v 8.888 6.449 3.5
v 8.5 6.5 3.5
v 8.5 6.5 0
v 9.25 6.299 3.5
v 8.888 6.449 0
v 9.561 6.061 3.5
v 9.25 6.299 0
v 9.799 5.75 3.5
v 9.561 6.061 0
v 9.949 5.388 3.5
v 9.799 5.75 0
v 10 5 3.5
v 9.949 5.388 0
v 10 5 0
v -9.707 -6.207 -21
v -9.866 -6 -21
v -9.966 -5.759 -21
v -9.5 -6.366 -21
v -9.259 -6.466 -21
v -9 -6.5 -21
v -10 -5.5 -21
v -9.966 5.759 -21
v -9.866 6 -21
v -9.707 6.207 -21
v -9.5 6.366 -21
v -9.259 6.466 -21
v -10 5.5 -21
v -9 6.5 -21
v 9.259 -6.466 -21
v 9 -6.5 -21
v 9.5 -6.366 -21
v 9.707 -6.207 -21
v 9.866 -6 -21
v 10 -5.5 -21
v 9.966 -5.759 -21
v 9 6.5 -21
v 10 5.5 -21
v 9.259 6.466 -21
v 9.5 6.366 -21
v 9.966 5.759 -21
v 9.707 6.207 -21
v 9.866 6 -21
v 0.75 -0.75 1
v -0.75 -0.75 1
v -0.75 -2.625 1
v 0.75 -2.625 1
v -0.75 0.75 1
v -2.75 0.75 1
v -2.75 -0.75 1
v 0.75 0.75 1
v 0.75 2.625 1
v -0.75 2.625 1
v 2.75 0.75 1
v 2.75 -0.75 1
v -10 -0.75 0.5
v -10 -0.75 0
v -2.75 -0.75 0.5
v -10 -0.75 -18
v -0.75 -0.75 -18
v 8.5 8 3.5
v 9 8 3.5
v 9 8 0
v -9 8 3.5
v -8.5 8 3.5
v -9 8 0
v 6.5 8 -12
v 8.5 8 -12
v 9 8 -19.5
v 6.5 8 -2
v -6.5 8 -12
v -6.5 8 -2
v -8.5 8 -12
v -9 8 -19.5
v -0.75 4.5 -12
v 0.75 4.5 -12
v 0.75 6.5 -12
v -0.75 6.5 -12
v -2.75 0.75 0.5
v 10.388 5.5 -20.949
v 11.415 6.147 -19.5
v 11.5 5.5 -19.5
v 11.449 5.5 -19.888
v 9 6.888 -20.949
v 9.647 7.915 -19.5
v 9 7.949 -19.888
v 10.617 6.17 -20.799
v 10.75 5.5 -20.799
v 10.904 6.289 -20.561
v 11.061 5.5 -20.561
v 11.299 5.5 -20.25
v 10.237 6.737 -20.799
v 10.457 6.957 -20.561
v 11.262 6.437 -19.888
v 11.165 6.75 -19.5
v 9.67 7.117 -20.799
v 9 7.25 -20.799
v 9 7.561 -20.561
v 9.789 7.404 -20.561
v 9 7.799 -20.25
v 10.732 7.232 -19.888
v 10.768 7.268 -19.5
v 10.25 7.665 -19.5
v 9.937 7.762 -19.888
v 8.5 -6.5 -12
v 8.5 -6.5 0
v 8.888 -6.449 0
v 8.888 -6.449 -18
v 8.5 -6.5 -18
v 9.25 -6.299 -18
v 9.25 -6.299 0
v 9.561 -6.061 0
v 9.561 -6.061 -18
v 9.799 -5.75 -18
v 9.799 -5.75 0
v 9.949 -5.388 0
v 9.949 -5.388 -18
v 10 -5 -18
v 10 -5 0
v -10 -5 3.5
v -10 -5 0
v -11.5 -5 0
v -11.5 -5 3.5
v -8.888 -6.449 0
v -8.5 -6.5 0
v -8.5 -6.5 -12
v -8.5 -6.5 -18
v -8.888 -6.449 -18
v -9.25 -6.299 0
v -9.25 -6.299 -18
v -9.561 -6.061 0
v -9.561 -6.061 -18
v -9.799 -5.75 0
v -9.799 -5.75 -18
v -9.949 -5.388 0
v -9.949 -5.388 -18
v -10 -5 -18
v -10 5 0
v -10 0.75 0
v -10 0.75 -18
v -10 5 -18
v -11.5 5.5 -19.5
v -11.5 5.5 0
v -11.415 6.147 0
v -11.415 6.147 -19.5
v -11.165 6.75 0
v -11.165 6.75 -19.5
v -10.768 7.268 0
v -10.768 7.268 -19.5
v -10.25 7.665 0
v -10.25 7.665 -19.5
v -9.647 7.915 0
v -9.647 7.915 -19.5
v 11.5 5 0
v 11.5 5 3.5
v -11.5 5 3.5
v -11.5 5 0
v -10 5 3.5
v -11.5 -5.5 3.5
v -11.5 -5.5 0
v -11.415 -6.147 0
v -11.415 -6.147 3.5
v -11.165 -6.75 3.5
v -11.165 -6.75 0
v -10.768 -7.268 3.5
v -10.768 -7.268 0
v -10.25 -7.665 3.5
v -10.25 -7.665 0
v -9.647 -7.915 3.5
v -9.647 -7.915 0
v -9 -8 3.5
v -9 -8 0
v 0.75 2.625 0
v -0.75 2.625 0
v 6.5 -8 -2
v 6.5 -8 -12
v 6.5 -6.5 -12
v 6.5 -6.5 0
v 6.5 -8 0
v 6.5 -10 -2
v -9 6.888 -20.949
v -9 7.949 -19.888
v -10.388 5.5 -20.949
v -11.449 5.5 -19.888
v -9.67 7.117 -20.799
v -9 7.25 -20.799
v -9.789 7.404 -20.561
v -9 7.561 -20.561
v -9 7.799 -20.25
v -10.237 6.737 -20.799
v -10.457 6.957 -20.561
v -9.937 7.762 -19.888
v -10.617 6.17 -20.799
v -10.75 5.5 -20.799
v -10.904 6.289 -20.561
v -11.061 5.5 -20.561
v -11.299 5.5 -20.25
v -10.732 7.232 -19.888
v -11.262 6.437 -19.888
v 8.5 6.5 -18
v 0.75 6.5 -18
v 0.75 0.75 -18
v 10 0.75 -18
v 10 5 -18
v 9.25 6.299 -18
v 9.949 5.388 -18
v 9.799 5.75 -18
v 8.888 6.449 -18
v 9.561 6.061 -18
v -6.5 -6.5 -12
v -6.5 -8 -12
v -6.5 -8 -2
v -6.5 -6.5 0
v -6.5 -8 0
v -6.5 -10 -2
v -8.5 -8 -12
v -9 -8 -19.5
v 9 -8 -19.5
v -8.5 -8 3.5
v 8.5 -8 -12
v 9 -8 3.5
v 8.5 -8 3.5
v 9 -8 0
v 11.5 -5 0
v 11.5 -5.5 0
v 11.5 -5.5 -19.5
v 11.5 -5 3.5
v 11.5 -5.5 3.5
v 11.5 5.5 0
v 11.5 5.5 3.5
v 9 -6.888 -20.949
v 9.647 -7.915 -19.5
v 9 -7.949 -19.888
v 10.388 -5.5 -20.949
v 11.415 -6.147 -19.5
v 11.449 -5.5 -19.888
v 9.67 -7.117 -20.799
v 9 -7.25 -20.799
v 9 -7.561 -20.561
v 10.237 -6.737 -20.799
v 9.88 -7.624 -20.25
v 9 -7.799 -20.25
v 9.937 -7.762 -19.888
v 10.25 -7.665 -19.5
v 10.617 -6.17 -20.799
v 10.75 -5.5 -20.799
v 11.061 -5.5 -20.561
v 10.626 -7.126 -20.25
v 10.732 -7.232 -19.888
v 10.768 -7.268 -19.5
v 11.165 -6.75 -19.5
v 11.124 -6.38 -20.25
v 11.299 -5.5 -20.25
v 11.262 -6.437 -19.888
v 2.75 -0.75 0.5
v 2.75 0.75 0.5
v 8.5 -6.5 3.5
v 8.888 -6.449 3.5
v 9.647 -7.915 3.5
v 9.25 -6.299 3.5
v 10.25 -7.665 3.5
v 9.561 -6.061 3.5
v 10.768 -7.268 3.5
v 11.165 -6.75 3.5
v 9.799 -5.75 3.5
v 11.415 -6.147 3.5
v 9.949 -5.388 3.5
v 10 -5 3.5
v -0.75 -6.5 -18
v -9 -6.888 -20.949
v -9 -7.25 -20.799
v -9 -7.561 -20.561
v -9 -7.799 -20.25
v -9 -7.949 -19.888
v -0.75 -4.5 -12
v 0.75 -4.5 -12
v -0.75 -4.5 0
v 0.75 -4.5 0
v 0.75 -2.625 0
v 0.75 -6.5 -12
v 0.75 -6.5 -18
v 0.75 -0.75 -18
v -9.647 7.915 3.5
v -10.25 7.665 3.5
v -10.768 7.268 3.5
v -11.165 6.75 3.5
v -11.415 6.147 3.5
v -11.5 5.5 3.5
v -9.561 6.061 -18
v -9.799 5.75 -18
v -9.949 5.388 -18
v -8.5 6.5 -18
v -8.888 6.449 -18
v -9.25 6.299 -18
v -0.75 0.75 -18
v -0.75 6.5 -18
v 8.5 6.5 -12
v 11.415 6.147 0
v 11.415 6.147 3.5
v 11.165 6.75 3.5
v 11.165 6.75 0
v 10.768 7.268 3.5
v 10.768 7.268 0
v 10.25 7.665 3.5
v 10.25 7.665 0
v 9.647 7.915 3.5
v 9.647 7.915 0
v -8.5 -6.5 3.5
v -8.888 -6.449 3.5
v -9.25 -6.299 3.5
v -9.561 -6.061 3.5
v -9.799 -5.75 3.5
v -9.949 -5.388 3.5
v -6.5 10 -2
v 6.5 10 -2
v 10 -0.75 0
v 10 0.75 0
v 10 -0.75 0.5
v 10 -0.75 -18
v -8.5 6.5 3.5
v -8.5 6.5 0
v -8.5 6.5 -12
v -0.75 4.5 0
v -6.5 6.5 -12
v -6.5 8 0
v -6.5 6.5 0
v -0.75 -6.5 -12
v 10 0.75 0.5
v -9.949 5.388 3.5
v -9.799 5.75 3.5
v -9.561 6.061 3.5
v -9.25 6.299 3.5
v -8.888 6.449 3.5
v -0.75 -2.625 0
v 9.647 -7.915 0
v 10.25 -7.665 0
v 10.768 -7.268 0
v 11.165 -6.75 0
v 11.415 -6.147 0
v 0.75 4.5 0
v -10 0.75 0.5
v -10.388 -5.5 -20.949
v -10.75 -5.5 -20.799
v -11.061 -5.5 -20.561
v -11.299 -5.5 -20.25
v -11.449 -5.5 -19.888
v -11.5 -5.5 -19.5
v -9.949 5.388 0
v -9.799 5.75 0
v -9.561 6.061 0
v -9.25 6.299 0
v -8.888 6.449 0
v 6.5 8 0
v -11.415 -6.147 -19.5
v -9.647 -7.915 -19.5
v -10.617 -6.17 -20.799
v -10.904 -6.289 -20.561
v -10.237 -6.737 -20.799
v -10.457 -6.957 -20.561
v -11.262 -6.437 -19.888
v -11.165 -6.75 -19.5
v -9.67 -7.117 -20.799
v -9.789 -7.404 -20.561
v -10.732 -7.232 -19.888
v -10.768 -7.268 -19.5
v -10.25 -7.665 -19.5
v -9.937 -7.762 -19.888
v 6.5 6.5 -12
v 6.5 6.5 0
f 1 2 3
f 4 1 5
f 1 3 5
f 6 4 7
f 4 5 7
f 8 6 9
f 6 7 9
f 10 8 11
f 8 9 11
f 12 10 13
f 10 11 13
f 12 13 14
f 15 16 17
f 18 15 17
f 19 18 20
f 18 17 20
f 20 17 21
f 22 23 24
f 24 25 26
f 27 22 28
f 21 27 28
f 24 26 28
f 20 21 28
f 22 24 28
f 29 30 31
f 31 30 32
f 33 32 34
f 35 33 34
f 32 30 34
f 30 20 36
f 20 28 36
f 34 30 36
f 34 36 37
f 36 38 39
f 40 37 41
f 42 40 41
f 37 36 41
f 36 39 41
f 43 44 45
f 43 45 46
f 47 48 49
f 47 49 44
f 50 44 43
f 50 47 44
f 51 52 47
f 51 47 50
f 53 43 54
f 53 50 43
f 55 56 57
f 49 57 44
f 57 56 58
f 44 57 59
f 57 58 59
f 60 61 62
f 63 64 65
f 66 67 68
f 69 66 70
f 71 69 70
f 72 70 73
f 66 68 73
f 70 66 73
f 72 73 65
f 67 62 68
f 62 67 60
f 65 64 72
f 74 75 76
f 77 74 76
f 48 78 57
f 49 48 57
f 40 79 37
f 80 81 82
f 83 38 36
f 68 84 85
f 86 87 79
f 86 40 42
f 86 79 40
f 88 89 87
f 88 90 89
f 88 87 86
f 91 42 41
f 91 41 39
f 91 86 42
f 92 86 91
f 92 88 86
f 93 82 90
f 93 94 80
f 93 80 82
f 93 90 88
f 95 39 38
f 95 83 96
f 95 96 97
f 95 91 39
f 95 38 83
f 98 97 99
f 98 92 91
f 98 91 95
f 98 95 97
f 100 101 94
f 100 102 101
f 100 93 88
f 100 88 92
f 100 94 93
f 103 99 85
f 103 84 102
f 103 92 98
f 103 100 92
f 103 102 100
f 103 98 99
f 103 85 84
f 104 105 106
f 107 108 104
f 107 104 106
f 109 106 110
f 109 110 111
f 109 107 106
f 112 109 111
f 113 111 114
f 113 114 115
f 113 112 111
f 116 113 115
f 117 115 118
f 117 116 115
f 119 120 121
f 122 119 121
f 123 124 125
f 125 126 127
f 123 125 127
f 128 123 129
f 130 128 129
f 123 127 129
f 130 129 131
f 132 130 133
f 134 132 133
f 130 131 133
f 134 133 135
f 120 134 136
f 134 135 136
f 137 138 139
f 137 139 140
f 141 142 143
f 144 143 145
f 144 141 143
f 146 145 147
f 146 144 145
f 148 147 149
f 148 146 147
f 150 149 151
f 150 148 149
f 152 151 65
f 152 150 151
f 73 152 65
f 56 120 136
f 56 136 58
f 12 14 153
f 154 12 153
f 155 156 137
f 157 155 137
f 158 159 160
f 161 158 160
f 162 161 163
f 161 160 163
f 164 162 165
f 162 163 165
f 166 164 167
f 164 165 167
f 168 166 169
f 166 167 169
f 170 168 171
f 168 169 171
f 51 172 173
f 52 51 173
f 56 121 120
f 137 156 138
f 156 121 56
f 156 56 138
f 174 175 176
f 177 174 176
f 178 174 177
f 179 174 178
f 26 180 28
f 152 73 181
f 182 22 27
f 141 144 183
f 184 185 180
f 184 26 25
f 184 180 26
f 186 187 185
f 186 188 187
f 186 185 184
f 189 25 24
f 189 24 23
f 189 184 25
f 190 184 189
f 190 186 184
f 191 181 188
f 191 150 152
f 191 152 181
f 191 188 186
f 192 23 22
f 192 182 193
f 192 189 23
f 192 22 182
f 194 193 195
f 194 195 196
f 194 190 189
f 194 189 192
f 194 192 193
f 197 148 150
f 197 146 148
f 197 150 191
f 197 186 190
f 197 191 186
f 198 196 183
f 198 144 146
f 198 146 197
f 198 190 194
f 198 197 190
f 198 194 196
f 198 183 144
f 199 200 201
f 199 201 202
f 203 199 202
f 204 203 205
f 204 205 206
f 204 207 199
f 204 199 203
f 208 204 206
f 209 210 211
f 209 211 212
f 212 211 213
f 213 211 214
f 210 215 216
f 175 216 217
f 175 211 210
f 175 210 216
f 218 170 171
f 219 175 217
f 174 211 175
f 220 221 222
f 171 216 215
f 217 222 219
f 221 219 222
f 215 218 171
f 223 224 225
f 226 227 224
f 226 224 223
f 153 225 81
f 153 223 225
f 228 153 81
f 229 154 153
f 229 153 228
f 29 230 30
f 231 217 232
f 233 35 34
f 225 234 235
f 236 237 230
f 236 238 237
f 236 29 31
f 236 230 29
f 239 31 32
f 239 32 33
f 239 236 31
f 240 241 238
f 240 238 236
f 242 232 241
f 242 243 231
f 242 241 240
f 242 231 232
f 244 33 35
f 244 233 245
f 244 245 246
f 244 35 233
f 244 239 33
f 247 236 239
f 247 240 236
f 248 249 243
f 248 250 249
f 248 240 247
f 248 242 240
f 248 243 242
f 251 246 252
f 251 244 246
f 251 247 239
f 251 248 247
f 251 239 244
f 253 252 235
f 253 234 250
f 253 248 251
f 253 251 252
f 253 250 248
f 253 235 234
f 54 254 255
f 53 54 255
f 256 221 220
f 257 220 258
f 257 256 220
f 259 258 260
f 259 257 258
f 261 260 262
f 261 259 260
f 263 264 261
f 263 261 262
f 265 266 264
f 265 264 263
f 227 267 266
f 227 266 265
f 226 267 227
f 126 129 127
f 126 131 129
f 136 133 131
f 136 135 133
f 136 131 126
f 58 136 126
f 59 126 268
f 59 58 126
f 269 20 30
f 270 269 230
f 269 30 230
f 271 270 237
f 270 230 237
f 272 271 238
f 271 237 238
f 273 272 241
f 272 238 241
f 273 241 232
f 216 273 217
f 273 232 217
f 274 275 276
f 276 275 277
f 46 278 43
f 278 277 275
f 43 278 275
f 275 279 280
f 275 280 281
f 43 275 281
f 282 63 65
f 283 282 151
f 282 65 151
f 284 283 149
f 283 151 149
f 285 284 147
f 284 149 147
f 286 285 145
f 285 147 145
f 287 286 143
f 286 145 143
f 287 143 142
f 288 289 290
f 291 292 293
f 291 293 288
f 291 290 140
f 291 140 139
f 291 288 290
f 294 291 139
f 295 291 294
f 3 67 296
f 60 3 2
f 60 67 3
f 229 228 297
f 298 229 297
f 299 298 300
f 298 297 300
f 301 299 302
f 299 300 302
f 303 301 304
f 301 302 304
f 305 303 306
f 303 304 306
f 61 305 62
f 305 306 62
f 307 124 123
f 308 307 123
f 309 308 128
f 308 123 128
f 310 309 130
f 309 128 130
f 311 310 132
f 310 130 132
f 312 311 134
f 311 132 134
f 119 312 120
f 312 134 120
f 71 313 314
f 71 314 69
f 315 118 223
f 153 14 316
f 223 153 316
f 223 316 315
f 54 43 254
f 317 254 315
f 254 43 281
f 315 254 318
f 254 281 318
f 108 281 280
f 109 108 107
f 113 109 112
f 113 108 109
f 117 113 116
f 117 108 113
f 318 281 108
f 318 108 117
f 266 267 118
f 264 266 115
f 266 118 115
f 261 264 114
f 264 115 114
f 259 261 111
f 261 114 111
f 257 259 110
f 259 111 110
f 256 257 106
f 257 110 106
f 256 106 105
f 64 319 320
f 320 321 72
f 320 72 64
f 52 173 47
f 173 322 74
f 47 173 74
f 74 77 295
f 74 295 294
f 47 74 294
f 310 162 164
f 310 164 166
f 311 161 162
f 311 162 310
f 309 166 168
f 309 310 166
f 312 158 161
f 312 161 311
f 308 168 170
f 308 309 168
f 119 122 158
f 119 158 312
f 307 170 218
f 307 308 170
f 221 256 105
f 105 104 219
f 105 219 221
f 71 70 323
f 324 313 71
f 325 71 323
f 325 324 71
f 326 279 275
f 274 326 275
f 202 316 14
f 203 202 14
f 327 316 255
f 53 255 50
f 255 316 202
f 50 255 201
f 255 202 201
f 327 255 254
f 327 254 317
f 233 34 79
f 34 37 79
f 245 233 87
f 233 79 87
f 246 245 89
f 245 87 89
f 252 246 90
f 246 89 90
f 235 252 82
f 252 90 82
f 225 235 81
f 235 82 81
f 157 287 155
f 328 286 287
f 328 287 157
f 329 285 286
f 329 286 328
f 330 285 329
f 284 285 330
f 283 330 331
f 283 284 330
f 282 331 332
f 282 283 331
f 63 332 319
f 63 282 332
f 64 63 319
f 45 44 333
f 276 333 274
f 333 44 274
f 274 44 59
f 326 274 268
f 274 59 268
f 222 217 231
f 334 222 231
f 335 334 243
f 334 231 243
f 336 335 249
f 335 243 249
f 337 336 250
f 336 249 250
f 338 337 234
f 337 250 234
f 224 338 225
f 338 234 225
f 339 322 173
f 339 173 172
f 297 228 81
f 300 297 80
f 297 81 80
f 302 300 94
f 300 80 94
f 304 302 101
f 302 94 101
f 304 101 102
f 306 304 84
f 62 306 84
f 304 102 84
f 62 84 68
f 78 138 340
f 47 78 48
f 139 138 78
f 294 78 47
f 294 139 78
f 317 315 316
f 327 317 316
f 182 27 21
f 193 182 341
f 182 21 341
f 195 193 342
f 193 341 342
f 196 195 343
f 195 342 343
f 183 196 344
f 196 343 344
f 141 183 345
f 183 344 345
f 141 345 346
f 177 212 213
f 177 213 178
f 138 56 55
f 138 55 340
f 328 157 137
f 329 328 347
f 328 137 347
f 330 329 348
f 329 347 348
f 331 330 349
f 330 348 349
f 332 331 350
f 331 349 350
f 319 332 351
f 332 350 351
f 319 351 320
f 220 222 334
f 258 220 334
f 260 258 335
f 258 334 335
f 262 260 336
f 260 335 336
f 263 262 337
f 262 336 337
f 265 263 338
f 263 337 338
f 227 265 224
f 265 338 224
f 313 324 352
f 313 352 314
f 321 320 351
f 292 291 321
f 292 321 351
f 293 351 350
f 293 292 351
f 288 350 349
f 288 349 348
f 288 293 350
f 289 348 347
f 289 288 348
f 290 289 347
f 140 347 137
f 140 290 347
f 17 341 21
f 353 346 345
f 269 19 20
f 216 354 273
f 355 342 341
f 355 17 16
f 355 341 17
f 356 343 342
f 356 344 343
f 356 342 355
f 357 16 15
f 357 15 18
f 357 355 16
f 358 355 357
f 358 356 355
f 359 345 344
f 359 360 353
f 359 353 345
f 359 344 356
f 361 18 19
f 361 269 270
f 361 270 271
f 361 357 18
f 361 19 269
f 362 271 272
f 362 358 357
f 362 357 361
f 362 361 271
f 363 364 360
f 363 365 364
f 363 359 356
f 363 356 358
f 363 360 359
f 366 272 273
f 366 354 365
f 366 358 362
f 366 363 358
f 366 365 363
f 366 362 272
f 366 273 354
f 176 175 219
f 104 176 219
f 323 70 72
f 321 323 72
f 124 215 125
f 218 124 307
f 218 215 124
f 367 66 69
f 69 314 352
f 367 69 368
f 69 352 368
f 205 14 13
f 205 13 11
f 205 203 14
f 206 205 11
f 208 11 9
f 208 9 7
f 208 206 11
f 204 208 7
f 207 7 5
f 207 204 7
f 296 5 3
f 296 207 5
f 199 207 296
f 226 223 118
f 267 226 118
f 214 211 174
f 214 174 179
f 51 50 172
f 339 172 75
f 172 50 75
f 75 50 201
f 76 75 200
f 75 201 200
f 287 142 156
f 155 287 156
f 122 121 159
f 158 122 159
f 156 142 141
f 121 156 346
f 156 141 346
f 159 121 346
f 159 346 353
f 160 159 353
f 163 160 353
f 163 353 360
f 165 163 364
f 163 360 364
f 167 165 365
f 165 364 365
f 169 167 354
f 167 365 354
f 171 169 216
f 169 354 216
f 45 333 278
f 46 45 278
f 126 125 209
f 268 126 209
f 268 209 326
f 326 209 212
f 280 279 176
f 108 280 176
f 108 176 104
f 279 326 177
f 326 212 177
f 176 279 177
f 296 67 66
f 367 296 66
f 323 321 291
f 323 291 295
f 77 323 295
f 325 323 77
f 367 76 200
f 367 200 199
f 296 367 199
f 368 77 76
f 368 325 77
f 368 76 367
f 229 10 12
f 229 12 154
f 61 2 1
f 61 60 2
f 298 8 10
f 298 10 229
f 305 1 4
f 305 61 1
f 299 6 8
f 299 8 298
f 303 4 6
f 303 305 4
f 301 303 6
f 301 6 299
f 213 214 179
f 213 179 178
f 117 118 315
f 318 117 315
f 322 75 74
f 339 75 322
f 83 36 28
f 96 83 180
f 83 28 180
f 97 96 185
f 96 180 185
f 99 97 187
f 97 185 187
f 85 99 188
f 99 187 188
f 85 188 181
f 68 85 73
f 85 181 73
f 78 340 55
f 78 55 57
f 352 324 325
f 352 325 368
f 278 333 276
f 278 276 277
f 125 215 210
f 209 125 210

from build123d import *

# Parameters (mm, degrees)
F0_W      = 23
F0_H      = 16
F1_DEPTH  = 21
F2_R      = 2.5
F3_W      = 9.25
F3_H      = 5.75
F4_DEPTH  = 18
F5_R      = 1.5
F6_W      = 2
F6_H      = 12
F7_DEPTH  = 1.5
F8_W      = 2
F8_H      = 12
F9_DEPTH  = 1.5
F10_W     = 2
F10_H     = 12
F11_DEPTH = 1.5
F14_DEPTH = 3.5
F16_DEPTH = 1
F18_W     = 7.25
F18_H     = 1.5
F17_W     = 7.25
F17_H     = 1.5
F19_DEPTH = 0.5
F20_R     = 1.5
F21_DEPTH = 13


with BuildPart() as f1:
    # F0 (on Top) → F1 (new body)
    with BuildSketch(Plane.XY):
        Rectangle(F0_W, F0_H)
    extrude(amount=-F1_DEPTH)

    # F2
    f2_edges = [f1.edges().sort_by_distance(p)[0] for p in [
        (11.5, -8, -10.5),
        (11.5, 8, -10.5),
        (-11.5, -8, -10.5),
        (-11.5, 8, -10.5),
    ]]
    fillet(f2_edges, radius=F2_R)

    # F3 (on face) → F4 (cut)
    with BuildSketch(Plane.XY):
        with Locations((-5.375, 3.625)):
            Rectangle(F3_W, F3_H)
        with Locations((5.375, 3.625)):
            Rectangle(F3_W, F3_H)
        with Locations((5.375, -3.625)):
            Rectangle(F3_W, F3_H)
        with Locations((-5.375, -3.625)):
            Rectangle(F3_W, F3_H)
    extrude(amount=-F4_DEPTH, mode=Mode.SUBTRACT)

    # F5
    f5_edges = [f1.edges().sort_by_distance(p)[0] for p in [
        (-10, 6.5, -9),
        (-10, -6.5, -9),
        (10, -6.5, -9),
        (10, 6.5, -9),
    ]]
    fillet(f5_edges, radius=F5_R)

    # F6 (on face) → F7 (cut, through all)
    with BuildSketch(Plane.YZ.offset(0.75)):
        with Locations((-5.5, -6)):
            Rectangle(F6_W, F6_H)
        with Locations((5.5, -6)):
            Rectangle(F6_W, F6_H)
    extrude(amount=-F7_DEPTH, mode=Mode.SUBTRACT)

    # F8 (on face) + F7_face (on face) → F9 (cut, through all)
    with BuildSketch(Plane(origin=(0, 8, 0), x_dir=(-1, 0, 0), z_dir=(0, 1, 0))):
        with Locations((7.5, -6)):
            Rectangle(F8_W, F8_H)
        with Locations((-7.5, -6)):
            Rectangle(F8_W, F8_H)
    with BuildSketch(Plane(origin=(0, 6.5, -8.8181818182), x_dir=(1, 0, 0), z_dir=(0, -1, 0))):
        Polygon((8.5, 8.8181818182), (-8.5, 8.8181818182), (-8.5, -9.1818181818), (-0.75, -9.1818181818), (-0.75, -3.1818181818), (0.75, -3.1818181818), (0.75, -9.1818181818), (8.5, -9.1818181818), align=None)
    extrude(amount=-F9_DEPTH, dir=(0, 1, 0), mode=Mode.SUBTRACT)

    # F10 (on face) → F11 (cut, through all)
    with BuildSketch(Plane.XZ.offset(8)):
        with Locations((-7.5, -6)):
            Rectangle(F10_W, F10_H)
        with Locations((7.5, -6)):
            Rectangle(F10_W, F10_H)
    extrude(amount=-F11_DEPTH, mode=Mode.SUBTRACT)

    # F13 (on face) → F14 (join)
    with BuildSketch(Plane.XY):
        with BuildLine():
            Line((-11.5, 5), (-10, 5))
            ThreePointArc((-10, 5), (-9.5606601718, 6.0606601718), (-8.5, 6.5))
            Line((-8.5, 6.5), (-8.5, 8))
            Line((-8.5, 8), (-9, 8))
            ThreePointArc((-9, 8), (-10.767766953, 7.267766953), (-11.5, 5.5))
            Line((-11.5, 5.5), (-11.5, 5))
        make_face()
        with BuildLine():
            Line((-10, -5), (-11.5, -5))
            Line((-11.5, -5), (-11.5, -5.5))
            ThreePointArc((-11.5, -5.5), (-10.767766953, -7.267766953), (-9, -8))
            Line((-9, -8), (-8.5, -8))
            Line((-8.5, -8), (-8.5, -6.5))
            ThreePointArc((-8.5, -6.5), (-9.5606601718, -6.0606601718), (-10, -5))
        make_face()
        with BuildLine():
            Line((11.5, -5), (10, -5))
            ThreePointArc((10, -5), (9.5606601718, -6.0606601718), (8.5, -6.5))
            Line((8.5, -6.5), (8.5, -8))
            Line((8.5, -8), (9, -8))
            ThreePointArc((9, -8), (10.767766953, -7.267766953), (11.5, -5.5))
            Line((11.5, -5.5), (11.5, -5))
        make_face()
        with BuildLine():
            ThreePointArc((8.5, 6.5), (9.5606601718, 6.0606601718), (10, 5))
            Line((10, 5), (11.5, 5))
            Line((11.5, 5), (11.5, 5.5))
            ThreePointArc((11.5, 5.5), (10.767766953, 7.267766953), (9, 8))
            Line((9, 8), (8.5, 8))
            Line((8.5, 8), (8.5, 6.5))
        make_face()
    extrude(amount=F14_DEPTH)

    # F15 (on face) → F16 (join)
    with BuildSketch(Plane.XY):
        Polygon((-0.75, 0.75), (-2.75, 0.75), (-2.75, -0.75), (-0.75, -0.75), (-0.75, -2.625), (0.75, -2.625), (0.75, -0.75), (2.75, -0.75), (2.75, 0.75), (0.75, 0.75), (0.75, 2.625), (-0.75, 2.625), align=None)
    extrude(amount=F16_DEPTH)

    # F18 (on face) + F17 (on face) → F19 (join)
    with BuildSketch(Plane.XY):
        with Locations((-6.375, 0)):
            Rectangle(F18_W, F18_H)
    with BuildSketch(Plane.XY):
        with Locations((6.375, 0)):
            Rectangle(F17_W, F17_H)
    extrude(amount=F19_DEPTH)

    # F20
    f20_edges = [f1.edges().sort_by_distance(p)[0] for p in [
        (11.5, 0, -21),
        (10.767767, 7.267767, -21),
        (0, 8, -21),
        (-10.767767, 7.267767, -21),
        (-11.5, 0, -21),
        (-10.767767, -7.267767, -21),
        (0, -8, -21),
        (10.767767, -7.267767, -21),
    ]]
    fillet(f20_edges, radius=F20_R)

    # F12 (on face) → F21 (join, through all)
    with BuildSketch(Plane(origin=(-6.5, 0, 0), x_dir=(0, -1, 0), z_dir=(-1, 0, 0))):
        Polygon((-8, -2), (-8, 0), (-10, -2), align=None)
        Polygon((8, -2), (10, -2), (8, 0), align=None)
    extrude(amount=-F21_DEPTH)


solid = f1.part
